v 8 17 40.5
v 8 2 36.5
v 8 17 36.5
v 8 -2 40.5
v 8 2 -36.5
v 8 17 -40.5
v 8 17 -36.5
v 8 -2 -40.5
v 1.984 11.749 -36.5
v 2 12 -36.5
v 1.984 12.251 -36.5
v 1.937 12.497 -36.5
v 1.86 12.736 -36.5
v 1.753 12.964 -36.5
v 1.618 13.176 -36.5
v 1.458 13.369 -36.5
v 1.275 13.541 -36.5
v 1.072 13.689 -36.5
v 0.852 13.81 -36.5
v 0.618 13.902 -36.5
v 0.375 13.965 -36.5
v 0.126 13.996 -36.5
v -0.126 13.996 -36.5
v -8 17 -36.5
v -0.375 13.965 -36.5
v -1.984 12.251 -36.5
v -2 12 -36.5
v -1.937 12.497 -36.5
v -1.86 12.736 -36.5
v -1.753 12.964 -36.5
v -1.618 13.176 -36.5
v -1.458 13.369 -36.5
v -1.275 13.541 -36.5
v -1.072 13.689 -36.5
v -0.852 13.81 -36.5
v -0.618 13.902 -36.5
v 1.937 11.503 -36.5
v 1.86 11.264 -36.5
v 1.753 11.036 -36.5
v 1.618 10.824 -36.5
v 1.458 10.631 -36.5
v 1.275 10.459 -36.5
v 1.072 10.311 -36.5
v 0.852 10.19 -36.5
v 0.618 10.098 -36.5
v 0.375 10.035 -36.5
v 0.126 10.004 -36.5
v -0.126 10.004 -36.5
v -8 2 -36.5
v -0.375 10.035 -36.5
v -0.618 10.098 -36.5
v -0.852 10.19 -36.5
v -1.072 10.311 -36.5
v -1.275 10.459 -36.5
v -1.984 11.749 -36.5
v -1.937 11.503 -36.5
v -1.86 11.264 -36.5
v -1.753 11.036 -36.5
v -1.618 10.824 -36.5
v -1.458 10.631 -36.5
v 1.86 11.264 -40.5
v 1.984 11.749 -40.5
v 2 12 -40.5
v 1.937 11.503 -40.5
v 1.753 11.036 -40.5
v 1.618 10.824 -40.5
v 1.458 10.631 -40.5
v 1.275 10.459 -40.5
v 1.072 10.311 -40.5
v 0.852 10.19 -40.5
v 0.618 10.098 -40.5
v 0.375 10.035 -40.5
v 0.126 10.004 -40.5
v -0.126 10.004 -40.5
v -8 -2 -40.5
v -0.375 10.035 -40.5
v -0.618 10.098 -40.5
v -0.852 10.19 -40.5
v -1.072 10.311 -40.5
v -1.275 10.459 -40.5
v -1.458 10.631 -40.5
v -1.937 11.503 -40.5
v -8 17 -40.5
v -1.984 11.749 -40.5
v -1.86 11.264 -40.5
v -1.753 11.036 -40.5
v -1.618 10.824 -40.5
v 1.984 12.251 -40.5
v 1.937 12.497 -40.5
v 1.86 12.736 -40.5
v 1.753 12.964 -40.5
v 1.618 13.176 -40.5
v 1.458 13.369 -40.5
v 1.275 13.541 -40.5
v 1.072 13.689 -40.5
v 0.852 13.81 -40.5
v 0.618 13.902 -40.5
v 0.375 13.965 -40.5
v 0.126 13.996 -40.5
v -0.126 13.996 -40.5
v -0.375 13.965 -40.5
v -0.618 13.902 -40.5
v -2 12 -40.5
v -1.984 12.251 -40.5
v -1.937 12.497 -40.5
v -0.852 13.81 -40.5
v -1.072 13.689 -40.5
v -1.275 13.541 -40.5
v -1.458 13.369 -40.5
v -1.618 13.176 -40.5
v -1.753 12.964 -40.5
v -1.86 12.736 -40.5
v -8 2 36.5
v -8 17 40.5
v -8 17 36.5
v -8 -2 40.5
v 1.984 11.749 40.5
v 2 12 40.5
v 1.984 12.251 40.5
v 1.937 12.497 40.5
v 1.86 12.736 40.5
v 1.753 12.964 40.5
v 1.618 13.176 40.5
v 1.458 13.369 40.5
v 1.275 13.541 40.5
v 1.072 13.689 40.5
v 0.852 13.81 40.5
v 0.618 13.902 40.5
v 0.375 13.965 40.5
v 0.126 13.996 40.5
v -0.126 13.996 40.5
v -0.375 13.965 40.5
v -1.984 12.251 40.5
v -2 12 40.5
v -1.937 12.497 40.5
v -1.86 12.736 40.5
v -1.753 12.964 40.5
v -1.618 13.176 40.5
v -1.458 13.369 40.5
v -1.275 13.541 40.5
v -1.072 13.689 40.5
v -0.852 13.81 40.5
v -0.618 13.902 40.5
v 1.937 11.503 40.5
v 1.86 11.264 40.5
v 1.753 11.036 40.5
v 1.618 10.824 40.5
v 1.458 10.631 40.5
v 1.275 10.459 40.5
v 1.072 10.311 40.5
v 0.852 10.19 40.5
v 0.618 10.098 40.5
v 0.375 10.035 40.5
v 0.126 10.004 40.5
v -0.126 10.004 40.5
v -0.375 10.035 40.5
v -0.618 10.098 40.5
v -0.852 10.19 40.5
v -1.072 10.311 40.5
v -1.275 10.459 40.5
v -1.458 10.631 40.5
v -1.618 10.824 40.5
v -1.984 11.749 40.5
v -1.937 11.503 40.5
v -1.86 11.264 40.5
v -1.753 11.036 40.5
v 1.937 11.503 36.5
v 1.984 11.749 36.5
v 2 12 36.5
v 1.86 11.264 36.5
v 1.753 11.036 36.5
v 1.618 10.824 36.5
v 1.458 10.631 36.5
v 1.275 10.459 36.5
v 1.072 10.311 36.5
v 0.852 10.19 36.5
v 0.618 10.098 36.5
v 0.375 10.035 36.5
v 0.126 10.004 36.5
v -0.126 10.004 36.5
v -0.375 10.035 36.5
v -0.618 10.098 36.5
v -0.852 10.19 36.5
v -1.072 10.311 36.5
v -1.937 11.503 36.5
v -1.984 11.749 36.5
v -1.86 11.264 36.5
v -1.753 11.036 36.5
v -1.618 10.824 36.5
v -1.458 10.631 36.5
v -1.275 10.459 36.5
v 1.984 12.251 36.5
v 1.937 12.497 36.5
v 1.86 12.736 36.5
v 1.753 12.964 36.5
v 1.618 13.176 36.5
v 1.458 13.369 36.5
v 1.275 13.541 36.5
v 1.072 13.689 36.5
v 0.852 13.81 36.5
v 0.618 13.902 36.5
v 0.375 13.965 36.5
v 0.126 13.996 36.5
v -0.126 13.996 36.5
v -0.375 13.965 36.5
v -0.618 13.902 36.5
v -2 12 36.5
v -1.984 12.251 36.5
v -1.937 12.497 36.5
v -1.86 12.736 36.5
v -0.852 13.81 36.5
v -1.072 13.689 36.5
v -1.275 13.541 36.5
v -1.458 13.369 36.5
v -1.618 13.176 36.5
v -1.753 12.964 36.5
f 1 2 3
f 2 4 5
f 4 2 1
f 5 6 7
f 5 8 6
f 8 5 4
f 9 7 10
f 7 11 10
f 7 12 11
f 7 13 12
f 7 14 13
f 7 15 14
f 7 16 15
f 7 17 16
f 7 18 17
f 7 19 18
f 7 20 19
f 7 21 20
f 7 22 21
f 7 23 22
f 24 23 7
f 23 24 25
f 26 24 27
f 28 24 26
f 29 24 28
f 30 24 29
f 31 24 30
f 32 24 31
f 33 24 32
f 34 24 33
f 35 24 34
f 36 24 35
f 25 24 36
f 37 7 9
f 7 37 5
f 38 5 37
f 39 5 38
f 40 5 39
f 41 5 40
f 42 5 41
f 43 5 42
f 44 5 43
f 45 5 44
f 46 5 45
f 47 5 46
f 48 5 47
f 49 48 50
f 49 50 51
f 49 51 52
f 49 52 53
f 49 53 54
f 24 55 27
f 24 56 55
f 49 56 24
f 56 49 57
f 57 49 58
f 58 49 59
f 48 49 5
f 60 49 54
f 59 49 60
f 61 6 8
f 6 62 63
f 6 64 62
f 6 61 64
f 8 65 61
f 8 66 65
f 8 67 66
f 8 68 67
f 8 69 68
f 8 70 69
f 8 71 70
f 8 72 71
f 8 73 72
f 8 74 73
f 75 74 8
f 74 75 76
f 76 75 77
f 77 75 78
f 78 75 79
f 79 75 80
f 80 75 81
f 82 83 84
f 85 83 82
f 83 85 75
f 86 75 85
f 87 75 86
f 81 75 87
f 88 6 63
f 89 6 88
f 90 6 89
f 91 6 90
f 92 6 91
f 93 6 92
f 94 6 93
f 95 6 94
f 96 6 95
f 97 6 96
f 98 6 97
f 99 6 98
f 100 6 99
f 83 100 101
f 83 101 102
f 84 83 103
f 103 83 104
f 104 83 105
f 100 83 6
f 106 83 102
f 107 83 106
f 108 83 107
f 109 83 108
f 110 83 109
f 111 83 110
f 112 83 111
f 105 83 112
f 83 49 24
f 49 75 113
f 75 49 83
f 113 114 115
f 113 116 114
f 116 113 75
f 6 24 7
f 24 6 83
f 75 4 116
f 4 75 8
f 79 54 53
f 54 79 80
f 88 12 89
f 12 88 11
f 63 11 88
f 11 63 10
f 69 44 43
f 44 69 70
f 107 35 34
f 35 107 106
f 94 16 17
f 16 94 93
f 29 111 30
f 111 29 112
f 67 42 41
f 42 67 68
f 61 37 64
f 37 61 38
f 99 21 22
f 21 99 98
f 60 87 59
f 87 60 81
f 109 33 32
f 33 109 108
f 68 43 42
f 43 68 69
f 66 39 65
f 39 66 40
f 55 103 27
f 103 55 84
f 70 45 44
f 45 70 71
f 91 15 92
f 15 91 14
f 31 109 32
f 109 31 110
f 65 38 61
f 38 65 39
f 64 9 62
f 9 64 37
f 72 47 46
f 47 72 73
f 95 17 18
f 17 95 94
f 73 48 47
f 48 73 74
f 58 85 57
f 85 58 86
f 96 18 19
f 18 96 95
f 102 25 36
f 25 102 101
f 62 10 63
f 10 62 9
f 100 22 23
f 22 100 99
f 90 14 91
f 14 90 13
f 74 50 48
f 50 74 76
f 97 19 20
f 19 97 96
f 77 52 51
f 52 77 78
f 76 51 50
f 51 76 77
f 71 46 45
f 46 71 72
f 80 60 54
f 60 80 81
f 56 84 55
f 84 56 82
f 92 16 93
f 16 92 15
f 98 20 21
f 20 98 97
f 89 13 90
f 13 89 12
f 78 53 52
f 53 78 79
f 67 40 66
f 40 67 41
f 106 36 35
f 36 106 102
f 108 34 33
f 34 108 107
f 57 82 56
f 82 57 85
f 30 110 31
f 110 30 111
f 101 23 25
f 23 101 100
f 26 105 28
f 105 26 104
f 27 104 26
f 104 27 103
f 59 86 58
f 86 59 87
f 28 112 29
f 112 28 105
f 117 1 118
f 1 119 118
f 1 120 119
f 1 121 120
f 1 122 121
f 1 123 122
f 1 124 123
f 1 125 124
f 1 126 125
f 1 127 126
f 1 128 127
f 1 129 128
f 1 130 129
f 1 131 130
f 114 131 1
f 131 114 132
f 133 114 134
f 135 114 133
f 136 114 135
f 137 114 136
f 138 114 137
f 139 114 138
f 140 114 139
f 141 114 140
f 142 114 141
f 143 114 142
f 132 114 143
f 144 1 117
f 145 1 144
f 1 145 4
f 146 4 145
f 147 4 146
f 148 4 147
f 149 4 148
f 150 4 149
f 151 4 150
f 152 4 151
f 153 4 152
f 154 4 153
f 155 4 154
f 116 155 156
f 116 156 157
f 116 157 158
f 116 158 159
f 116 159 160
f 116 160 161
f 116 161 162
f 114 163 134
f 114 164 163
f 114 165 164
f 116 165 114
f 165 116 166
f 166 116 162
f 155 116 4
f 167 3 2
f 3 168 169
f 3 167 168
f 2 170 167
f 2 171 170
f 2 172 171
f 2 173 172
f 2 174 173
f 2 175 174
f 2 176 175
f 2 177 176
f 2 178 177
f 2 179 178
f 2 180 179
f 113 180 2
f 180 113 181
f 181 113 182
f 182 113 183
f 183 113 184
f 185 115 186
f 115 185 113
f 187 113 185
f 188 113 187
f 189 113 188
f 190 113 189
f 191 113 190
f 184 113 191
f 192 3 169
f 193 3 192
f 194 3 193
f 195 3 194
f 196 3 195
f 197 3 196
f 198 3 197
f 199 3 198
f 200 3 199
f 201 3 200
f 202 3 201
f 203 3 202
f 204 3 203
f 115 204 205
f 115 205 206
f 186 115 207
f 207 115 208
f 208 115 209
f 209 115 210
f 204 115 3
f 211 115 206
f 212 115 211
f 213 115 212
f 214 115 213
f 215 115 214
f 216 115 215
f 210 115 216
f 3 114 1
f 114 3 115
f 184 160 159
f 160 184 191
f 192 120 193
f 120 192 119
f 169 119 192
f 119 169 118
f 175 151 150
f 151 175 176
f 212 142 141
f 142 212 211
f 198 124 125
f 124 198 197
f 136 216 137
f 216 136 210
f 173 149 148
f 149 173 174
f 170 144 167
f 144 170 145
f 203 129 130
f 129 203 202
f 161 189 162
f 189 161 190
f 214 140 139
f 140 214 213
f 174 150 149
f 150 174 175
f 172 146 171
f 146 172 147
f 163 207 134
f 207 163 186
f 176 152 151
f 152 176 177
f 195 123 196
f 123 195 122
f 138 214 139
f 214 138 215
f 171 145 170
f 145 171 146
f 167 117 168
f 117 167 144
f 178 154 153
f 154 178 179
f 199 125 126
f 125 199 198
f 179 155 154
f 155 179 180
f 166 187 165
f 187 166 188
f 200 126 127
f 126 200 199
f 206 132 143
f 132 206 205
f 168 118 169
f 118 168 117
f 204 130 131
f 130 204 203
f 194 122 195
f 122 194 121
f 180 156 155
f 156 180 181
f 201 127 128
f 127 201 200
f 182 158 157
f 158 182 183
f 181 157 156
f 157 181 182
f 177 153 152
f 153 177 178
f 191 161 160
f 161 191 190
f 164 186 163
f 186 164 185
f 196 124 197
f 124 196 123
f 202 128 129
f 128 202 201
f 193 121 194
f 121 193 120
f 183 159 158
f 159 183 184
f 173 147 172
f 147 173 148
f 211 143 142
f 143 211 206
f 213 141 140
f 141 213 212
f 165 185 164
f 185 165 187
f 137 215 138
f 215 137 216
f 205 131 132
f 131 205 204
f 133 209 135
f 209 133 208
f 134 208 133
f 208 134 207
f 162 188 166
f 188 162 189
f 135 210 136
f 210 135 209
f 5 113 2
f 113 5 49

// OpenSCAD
$fn = 50;

wall = 3;

block_sz_x = 40;
block_sz_y = 40;
block_sz_z = 4;

hole_dist = 72;

cover_sz_x = 80;
cover_sz_y = 80;

hole_d = 4;

heat_block_sz_x = 20;
heat_block_sz_y = 16;
heat_block_sz_z = 12;

heat_block_cover_off_z = heat_block_sz_z - block_sz_z;

fan_bracket_sz_x = 16;
fan_bracket_sz_y = 4;
fan_bracket_sz_z = 77;

fan_bracket_leave_sz_x = fan_bracket_sz_x;
fan_bracket_leave_sz_y = 15;
fan_bracket_leave_sz_z = fan_bracket_sz_y;

fan_bracket_hole_offset = 5;

module pcr_tube() {
  tube_top_d = 9.6;
  tube_top_h = 17;
  tube_middle_d = 7.5;
  tube_middle_h = 12.1;
  tube_bottom_d = 4;
  translate([0, 0, tube_middle_h]) {
    cylinder(d2=tube_top_d, d1=tube_middle_d, h=tube_top_h);
  }
  cylinder(d2=tube_middle_d, d1=tube_bottom_d, h=tube_middle_h);
}

module holes_block(holes=true) {
    for(angle=[0, 90, 180, 270]) {
      rotate([0, 0, angle]) {
        translate([(block_sz_x-wall)/2-4, (block_sz_y-wall)/2-8, 0]) {
          if(holes) {
            cylinder(d=8, h=wall, center=true);
          } else {
            difference() {
              translate([0, 0, 9]) {
                cylinder(d=12, h=20, center=true);
              }
              translate([0, 0, -9]) {
                pcr_tube();
              }
            }
          }
        }
        if(holes) {
          translate([(block_sz_x-wall)/2-17, (block_sz_y-wall)/2-8.5, 0]) {
            cylinder(d=8, h=wall, center=true);
          }
        }
      }
    }
}

module spec_cross(make_hole=true) {
  difference() {
    translate([0, 0, -block_sz_z/2]) {
      difference() {
        union() {
          cube([block_sz_x+14, block_sz_y+14, wall], center=true);
          for(angl=[0,1]) {
              rotate([0, 0, 45+angl*90]) {
                cube([cover_sz_x+20, 15, wall], center=true);
                for(xsgn=[-1, 1]) {
                  translate([xsgn*(cover_sz_x+20)/2, 0, 0]) {
                    cylinder(d=15, h=wall, center=true);
                  }
                }
              }
          }
          holes_block(holes=false);
        }
        if(make_hole) {
          cube([block_sz_x-wall, block_sz_y-wall, wall], center=true);
        } else {
          holes_block();
        }
        for(xsgn=[-1,1]) {
          for(ysgn=[-1,1]) {
            translate([xsgn*hole_dist/2, ysgn*hole_dist/2, 0]) {
              cylinder(d=hole_d, h=50, center=true);
            }
          }
        }
      }
    }
  }
}

module peltier_fan_holder() {
  difference() {
    cube([block_sz_x+2*wall, block_sz_y+2*wall, block_sz_z], center=true);
    cube([block_sz_x, block_sz_y, block_sz_z], center=true);
    for(xsgn=[-1,1]) {
      for(ysgn=[-1,1]) {
        translate([xsgn*block_sz_x/2, ysgn*block_sz_y/2, 0]) {
          cube([10, 10, 10], center=true);
        }
      }
    }
  }
  spec_cross();
}

module heater_holder() {
  spec_cross(false);
}

module stand() {
    difference() {
      cylinder(d=hole_d+wall*2, h=heat_block_cover_off_z, center=true);
      cylinder(d=hole_d, h=heat_block_cover_off_z, center=true);
    }
}

module fan_bracket() {
  cube([fan_bracket_sz_x, fan_bracket_sz_y, fan_bracket_sz_z], center=true);
  for(zsgn=[-1,1]) {
    translate([0, fan_bracket_leave_sz_y/2, zsgn*fan_bracket_sz_z/2]) {
      difference() {
        cube([fan_bracket_leave_sz_x, fan_bracket_leave_sz_y+fan_bracket_sz_y, fan_bracket_leave_sz_z], center=true);
        translate([0, (fan_bracket_leave_sz_y+fan_bracket_sz_y)/2-fan_bracket_hole_offset, 0]) {
          cylinder(d=hole_d, h=20, center=true);
        }
      }
    }
  }
}
 
rotate([180, 0, 0]) {
  translate([0, 0, (block_sz_z+wall)/2]) {
    //peltier_fan_holder();
  }
}
translate([0, 0, heat_block_cover_off_z+(block_sz_z+wall)/2]) {
//	scale([1, 1, 0.3]) {
//    heater_holder();
//  }
}
translate([0, 0, (block_sz_z+wall)/2]) {
  for(xsgn=[-1,1]) {
    for(ysgn=[-1,1]) {
      translate([xsgn*hole_dist/2, ysgn*hole_dist/2, 0]) {
//        stand();
      }
    }
  }
}

translate([0, 0, -fan_bracket_sz_z/2-10]) {
  //fan_bracket_move = fan_bracket_leave_sz_y+2;
  fan_bracket_move = fan_bracket_leave_sz_y+fan_bracket_sz_y-fan_bracket_hole_offset/2;
  for(xsgn=[-1,1]) {
    for(ysgn=[-1,1]) {
      translate([xsgn*hole_dist/2-ysgn*xsgn*fan_bracket_move/2-((ysgn>0) ? ((xsgn<0) ? fan_bracket_move : -fan_bracket_move): 0), ysgn*hole_dist/2-fan_bracket_move/2+((ysgn>0) ? fan_bracket_move: 0), 0]) {
        rotate([0, 0, -45*ysgn*xsgn+((ysgn>0) ? 180 : 0)]) {
!          fan_bracket();
        }
      }
    }
  }
}
